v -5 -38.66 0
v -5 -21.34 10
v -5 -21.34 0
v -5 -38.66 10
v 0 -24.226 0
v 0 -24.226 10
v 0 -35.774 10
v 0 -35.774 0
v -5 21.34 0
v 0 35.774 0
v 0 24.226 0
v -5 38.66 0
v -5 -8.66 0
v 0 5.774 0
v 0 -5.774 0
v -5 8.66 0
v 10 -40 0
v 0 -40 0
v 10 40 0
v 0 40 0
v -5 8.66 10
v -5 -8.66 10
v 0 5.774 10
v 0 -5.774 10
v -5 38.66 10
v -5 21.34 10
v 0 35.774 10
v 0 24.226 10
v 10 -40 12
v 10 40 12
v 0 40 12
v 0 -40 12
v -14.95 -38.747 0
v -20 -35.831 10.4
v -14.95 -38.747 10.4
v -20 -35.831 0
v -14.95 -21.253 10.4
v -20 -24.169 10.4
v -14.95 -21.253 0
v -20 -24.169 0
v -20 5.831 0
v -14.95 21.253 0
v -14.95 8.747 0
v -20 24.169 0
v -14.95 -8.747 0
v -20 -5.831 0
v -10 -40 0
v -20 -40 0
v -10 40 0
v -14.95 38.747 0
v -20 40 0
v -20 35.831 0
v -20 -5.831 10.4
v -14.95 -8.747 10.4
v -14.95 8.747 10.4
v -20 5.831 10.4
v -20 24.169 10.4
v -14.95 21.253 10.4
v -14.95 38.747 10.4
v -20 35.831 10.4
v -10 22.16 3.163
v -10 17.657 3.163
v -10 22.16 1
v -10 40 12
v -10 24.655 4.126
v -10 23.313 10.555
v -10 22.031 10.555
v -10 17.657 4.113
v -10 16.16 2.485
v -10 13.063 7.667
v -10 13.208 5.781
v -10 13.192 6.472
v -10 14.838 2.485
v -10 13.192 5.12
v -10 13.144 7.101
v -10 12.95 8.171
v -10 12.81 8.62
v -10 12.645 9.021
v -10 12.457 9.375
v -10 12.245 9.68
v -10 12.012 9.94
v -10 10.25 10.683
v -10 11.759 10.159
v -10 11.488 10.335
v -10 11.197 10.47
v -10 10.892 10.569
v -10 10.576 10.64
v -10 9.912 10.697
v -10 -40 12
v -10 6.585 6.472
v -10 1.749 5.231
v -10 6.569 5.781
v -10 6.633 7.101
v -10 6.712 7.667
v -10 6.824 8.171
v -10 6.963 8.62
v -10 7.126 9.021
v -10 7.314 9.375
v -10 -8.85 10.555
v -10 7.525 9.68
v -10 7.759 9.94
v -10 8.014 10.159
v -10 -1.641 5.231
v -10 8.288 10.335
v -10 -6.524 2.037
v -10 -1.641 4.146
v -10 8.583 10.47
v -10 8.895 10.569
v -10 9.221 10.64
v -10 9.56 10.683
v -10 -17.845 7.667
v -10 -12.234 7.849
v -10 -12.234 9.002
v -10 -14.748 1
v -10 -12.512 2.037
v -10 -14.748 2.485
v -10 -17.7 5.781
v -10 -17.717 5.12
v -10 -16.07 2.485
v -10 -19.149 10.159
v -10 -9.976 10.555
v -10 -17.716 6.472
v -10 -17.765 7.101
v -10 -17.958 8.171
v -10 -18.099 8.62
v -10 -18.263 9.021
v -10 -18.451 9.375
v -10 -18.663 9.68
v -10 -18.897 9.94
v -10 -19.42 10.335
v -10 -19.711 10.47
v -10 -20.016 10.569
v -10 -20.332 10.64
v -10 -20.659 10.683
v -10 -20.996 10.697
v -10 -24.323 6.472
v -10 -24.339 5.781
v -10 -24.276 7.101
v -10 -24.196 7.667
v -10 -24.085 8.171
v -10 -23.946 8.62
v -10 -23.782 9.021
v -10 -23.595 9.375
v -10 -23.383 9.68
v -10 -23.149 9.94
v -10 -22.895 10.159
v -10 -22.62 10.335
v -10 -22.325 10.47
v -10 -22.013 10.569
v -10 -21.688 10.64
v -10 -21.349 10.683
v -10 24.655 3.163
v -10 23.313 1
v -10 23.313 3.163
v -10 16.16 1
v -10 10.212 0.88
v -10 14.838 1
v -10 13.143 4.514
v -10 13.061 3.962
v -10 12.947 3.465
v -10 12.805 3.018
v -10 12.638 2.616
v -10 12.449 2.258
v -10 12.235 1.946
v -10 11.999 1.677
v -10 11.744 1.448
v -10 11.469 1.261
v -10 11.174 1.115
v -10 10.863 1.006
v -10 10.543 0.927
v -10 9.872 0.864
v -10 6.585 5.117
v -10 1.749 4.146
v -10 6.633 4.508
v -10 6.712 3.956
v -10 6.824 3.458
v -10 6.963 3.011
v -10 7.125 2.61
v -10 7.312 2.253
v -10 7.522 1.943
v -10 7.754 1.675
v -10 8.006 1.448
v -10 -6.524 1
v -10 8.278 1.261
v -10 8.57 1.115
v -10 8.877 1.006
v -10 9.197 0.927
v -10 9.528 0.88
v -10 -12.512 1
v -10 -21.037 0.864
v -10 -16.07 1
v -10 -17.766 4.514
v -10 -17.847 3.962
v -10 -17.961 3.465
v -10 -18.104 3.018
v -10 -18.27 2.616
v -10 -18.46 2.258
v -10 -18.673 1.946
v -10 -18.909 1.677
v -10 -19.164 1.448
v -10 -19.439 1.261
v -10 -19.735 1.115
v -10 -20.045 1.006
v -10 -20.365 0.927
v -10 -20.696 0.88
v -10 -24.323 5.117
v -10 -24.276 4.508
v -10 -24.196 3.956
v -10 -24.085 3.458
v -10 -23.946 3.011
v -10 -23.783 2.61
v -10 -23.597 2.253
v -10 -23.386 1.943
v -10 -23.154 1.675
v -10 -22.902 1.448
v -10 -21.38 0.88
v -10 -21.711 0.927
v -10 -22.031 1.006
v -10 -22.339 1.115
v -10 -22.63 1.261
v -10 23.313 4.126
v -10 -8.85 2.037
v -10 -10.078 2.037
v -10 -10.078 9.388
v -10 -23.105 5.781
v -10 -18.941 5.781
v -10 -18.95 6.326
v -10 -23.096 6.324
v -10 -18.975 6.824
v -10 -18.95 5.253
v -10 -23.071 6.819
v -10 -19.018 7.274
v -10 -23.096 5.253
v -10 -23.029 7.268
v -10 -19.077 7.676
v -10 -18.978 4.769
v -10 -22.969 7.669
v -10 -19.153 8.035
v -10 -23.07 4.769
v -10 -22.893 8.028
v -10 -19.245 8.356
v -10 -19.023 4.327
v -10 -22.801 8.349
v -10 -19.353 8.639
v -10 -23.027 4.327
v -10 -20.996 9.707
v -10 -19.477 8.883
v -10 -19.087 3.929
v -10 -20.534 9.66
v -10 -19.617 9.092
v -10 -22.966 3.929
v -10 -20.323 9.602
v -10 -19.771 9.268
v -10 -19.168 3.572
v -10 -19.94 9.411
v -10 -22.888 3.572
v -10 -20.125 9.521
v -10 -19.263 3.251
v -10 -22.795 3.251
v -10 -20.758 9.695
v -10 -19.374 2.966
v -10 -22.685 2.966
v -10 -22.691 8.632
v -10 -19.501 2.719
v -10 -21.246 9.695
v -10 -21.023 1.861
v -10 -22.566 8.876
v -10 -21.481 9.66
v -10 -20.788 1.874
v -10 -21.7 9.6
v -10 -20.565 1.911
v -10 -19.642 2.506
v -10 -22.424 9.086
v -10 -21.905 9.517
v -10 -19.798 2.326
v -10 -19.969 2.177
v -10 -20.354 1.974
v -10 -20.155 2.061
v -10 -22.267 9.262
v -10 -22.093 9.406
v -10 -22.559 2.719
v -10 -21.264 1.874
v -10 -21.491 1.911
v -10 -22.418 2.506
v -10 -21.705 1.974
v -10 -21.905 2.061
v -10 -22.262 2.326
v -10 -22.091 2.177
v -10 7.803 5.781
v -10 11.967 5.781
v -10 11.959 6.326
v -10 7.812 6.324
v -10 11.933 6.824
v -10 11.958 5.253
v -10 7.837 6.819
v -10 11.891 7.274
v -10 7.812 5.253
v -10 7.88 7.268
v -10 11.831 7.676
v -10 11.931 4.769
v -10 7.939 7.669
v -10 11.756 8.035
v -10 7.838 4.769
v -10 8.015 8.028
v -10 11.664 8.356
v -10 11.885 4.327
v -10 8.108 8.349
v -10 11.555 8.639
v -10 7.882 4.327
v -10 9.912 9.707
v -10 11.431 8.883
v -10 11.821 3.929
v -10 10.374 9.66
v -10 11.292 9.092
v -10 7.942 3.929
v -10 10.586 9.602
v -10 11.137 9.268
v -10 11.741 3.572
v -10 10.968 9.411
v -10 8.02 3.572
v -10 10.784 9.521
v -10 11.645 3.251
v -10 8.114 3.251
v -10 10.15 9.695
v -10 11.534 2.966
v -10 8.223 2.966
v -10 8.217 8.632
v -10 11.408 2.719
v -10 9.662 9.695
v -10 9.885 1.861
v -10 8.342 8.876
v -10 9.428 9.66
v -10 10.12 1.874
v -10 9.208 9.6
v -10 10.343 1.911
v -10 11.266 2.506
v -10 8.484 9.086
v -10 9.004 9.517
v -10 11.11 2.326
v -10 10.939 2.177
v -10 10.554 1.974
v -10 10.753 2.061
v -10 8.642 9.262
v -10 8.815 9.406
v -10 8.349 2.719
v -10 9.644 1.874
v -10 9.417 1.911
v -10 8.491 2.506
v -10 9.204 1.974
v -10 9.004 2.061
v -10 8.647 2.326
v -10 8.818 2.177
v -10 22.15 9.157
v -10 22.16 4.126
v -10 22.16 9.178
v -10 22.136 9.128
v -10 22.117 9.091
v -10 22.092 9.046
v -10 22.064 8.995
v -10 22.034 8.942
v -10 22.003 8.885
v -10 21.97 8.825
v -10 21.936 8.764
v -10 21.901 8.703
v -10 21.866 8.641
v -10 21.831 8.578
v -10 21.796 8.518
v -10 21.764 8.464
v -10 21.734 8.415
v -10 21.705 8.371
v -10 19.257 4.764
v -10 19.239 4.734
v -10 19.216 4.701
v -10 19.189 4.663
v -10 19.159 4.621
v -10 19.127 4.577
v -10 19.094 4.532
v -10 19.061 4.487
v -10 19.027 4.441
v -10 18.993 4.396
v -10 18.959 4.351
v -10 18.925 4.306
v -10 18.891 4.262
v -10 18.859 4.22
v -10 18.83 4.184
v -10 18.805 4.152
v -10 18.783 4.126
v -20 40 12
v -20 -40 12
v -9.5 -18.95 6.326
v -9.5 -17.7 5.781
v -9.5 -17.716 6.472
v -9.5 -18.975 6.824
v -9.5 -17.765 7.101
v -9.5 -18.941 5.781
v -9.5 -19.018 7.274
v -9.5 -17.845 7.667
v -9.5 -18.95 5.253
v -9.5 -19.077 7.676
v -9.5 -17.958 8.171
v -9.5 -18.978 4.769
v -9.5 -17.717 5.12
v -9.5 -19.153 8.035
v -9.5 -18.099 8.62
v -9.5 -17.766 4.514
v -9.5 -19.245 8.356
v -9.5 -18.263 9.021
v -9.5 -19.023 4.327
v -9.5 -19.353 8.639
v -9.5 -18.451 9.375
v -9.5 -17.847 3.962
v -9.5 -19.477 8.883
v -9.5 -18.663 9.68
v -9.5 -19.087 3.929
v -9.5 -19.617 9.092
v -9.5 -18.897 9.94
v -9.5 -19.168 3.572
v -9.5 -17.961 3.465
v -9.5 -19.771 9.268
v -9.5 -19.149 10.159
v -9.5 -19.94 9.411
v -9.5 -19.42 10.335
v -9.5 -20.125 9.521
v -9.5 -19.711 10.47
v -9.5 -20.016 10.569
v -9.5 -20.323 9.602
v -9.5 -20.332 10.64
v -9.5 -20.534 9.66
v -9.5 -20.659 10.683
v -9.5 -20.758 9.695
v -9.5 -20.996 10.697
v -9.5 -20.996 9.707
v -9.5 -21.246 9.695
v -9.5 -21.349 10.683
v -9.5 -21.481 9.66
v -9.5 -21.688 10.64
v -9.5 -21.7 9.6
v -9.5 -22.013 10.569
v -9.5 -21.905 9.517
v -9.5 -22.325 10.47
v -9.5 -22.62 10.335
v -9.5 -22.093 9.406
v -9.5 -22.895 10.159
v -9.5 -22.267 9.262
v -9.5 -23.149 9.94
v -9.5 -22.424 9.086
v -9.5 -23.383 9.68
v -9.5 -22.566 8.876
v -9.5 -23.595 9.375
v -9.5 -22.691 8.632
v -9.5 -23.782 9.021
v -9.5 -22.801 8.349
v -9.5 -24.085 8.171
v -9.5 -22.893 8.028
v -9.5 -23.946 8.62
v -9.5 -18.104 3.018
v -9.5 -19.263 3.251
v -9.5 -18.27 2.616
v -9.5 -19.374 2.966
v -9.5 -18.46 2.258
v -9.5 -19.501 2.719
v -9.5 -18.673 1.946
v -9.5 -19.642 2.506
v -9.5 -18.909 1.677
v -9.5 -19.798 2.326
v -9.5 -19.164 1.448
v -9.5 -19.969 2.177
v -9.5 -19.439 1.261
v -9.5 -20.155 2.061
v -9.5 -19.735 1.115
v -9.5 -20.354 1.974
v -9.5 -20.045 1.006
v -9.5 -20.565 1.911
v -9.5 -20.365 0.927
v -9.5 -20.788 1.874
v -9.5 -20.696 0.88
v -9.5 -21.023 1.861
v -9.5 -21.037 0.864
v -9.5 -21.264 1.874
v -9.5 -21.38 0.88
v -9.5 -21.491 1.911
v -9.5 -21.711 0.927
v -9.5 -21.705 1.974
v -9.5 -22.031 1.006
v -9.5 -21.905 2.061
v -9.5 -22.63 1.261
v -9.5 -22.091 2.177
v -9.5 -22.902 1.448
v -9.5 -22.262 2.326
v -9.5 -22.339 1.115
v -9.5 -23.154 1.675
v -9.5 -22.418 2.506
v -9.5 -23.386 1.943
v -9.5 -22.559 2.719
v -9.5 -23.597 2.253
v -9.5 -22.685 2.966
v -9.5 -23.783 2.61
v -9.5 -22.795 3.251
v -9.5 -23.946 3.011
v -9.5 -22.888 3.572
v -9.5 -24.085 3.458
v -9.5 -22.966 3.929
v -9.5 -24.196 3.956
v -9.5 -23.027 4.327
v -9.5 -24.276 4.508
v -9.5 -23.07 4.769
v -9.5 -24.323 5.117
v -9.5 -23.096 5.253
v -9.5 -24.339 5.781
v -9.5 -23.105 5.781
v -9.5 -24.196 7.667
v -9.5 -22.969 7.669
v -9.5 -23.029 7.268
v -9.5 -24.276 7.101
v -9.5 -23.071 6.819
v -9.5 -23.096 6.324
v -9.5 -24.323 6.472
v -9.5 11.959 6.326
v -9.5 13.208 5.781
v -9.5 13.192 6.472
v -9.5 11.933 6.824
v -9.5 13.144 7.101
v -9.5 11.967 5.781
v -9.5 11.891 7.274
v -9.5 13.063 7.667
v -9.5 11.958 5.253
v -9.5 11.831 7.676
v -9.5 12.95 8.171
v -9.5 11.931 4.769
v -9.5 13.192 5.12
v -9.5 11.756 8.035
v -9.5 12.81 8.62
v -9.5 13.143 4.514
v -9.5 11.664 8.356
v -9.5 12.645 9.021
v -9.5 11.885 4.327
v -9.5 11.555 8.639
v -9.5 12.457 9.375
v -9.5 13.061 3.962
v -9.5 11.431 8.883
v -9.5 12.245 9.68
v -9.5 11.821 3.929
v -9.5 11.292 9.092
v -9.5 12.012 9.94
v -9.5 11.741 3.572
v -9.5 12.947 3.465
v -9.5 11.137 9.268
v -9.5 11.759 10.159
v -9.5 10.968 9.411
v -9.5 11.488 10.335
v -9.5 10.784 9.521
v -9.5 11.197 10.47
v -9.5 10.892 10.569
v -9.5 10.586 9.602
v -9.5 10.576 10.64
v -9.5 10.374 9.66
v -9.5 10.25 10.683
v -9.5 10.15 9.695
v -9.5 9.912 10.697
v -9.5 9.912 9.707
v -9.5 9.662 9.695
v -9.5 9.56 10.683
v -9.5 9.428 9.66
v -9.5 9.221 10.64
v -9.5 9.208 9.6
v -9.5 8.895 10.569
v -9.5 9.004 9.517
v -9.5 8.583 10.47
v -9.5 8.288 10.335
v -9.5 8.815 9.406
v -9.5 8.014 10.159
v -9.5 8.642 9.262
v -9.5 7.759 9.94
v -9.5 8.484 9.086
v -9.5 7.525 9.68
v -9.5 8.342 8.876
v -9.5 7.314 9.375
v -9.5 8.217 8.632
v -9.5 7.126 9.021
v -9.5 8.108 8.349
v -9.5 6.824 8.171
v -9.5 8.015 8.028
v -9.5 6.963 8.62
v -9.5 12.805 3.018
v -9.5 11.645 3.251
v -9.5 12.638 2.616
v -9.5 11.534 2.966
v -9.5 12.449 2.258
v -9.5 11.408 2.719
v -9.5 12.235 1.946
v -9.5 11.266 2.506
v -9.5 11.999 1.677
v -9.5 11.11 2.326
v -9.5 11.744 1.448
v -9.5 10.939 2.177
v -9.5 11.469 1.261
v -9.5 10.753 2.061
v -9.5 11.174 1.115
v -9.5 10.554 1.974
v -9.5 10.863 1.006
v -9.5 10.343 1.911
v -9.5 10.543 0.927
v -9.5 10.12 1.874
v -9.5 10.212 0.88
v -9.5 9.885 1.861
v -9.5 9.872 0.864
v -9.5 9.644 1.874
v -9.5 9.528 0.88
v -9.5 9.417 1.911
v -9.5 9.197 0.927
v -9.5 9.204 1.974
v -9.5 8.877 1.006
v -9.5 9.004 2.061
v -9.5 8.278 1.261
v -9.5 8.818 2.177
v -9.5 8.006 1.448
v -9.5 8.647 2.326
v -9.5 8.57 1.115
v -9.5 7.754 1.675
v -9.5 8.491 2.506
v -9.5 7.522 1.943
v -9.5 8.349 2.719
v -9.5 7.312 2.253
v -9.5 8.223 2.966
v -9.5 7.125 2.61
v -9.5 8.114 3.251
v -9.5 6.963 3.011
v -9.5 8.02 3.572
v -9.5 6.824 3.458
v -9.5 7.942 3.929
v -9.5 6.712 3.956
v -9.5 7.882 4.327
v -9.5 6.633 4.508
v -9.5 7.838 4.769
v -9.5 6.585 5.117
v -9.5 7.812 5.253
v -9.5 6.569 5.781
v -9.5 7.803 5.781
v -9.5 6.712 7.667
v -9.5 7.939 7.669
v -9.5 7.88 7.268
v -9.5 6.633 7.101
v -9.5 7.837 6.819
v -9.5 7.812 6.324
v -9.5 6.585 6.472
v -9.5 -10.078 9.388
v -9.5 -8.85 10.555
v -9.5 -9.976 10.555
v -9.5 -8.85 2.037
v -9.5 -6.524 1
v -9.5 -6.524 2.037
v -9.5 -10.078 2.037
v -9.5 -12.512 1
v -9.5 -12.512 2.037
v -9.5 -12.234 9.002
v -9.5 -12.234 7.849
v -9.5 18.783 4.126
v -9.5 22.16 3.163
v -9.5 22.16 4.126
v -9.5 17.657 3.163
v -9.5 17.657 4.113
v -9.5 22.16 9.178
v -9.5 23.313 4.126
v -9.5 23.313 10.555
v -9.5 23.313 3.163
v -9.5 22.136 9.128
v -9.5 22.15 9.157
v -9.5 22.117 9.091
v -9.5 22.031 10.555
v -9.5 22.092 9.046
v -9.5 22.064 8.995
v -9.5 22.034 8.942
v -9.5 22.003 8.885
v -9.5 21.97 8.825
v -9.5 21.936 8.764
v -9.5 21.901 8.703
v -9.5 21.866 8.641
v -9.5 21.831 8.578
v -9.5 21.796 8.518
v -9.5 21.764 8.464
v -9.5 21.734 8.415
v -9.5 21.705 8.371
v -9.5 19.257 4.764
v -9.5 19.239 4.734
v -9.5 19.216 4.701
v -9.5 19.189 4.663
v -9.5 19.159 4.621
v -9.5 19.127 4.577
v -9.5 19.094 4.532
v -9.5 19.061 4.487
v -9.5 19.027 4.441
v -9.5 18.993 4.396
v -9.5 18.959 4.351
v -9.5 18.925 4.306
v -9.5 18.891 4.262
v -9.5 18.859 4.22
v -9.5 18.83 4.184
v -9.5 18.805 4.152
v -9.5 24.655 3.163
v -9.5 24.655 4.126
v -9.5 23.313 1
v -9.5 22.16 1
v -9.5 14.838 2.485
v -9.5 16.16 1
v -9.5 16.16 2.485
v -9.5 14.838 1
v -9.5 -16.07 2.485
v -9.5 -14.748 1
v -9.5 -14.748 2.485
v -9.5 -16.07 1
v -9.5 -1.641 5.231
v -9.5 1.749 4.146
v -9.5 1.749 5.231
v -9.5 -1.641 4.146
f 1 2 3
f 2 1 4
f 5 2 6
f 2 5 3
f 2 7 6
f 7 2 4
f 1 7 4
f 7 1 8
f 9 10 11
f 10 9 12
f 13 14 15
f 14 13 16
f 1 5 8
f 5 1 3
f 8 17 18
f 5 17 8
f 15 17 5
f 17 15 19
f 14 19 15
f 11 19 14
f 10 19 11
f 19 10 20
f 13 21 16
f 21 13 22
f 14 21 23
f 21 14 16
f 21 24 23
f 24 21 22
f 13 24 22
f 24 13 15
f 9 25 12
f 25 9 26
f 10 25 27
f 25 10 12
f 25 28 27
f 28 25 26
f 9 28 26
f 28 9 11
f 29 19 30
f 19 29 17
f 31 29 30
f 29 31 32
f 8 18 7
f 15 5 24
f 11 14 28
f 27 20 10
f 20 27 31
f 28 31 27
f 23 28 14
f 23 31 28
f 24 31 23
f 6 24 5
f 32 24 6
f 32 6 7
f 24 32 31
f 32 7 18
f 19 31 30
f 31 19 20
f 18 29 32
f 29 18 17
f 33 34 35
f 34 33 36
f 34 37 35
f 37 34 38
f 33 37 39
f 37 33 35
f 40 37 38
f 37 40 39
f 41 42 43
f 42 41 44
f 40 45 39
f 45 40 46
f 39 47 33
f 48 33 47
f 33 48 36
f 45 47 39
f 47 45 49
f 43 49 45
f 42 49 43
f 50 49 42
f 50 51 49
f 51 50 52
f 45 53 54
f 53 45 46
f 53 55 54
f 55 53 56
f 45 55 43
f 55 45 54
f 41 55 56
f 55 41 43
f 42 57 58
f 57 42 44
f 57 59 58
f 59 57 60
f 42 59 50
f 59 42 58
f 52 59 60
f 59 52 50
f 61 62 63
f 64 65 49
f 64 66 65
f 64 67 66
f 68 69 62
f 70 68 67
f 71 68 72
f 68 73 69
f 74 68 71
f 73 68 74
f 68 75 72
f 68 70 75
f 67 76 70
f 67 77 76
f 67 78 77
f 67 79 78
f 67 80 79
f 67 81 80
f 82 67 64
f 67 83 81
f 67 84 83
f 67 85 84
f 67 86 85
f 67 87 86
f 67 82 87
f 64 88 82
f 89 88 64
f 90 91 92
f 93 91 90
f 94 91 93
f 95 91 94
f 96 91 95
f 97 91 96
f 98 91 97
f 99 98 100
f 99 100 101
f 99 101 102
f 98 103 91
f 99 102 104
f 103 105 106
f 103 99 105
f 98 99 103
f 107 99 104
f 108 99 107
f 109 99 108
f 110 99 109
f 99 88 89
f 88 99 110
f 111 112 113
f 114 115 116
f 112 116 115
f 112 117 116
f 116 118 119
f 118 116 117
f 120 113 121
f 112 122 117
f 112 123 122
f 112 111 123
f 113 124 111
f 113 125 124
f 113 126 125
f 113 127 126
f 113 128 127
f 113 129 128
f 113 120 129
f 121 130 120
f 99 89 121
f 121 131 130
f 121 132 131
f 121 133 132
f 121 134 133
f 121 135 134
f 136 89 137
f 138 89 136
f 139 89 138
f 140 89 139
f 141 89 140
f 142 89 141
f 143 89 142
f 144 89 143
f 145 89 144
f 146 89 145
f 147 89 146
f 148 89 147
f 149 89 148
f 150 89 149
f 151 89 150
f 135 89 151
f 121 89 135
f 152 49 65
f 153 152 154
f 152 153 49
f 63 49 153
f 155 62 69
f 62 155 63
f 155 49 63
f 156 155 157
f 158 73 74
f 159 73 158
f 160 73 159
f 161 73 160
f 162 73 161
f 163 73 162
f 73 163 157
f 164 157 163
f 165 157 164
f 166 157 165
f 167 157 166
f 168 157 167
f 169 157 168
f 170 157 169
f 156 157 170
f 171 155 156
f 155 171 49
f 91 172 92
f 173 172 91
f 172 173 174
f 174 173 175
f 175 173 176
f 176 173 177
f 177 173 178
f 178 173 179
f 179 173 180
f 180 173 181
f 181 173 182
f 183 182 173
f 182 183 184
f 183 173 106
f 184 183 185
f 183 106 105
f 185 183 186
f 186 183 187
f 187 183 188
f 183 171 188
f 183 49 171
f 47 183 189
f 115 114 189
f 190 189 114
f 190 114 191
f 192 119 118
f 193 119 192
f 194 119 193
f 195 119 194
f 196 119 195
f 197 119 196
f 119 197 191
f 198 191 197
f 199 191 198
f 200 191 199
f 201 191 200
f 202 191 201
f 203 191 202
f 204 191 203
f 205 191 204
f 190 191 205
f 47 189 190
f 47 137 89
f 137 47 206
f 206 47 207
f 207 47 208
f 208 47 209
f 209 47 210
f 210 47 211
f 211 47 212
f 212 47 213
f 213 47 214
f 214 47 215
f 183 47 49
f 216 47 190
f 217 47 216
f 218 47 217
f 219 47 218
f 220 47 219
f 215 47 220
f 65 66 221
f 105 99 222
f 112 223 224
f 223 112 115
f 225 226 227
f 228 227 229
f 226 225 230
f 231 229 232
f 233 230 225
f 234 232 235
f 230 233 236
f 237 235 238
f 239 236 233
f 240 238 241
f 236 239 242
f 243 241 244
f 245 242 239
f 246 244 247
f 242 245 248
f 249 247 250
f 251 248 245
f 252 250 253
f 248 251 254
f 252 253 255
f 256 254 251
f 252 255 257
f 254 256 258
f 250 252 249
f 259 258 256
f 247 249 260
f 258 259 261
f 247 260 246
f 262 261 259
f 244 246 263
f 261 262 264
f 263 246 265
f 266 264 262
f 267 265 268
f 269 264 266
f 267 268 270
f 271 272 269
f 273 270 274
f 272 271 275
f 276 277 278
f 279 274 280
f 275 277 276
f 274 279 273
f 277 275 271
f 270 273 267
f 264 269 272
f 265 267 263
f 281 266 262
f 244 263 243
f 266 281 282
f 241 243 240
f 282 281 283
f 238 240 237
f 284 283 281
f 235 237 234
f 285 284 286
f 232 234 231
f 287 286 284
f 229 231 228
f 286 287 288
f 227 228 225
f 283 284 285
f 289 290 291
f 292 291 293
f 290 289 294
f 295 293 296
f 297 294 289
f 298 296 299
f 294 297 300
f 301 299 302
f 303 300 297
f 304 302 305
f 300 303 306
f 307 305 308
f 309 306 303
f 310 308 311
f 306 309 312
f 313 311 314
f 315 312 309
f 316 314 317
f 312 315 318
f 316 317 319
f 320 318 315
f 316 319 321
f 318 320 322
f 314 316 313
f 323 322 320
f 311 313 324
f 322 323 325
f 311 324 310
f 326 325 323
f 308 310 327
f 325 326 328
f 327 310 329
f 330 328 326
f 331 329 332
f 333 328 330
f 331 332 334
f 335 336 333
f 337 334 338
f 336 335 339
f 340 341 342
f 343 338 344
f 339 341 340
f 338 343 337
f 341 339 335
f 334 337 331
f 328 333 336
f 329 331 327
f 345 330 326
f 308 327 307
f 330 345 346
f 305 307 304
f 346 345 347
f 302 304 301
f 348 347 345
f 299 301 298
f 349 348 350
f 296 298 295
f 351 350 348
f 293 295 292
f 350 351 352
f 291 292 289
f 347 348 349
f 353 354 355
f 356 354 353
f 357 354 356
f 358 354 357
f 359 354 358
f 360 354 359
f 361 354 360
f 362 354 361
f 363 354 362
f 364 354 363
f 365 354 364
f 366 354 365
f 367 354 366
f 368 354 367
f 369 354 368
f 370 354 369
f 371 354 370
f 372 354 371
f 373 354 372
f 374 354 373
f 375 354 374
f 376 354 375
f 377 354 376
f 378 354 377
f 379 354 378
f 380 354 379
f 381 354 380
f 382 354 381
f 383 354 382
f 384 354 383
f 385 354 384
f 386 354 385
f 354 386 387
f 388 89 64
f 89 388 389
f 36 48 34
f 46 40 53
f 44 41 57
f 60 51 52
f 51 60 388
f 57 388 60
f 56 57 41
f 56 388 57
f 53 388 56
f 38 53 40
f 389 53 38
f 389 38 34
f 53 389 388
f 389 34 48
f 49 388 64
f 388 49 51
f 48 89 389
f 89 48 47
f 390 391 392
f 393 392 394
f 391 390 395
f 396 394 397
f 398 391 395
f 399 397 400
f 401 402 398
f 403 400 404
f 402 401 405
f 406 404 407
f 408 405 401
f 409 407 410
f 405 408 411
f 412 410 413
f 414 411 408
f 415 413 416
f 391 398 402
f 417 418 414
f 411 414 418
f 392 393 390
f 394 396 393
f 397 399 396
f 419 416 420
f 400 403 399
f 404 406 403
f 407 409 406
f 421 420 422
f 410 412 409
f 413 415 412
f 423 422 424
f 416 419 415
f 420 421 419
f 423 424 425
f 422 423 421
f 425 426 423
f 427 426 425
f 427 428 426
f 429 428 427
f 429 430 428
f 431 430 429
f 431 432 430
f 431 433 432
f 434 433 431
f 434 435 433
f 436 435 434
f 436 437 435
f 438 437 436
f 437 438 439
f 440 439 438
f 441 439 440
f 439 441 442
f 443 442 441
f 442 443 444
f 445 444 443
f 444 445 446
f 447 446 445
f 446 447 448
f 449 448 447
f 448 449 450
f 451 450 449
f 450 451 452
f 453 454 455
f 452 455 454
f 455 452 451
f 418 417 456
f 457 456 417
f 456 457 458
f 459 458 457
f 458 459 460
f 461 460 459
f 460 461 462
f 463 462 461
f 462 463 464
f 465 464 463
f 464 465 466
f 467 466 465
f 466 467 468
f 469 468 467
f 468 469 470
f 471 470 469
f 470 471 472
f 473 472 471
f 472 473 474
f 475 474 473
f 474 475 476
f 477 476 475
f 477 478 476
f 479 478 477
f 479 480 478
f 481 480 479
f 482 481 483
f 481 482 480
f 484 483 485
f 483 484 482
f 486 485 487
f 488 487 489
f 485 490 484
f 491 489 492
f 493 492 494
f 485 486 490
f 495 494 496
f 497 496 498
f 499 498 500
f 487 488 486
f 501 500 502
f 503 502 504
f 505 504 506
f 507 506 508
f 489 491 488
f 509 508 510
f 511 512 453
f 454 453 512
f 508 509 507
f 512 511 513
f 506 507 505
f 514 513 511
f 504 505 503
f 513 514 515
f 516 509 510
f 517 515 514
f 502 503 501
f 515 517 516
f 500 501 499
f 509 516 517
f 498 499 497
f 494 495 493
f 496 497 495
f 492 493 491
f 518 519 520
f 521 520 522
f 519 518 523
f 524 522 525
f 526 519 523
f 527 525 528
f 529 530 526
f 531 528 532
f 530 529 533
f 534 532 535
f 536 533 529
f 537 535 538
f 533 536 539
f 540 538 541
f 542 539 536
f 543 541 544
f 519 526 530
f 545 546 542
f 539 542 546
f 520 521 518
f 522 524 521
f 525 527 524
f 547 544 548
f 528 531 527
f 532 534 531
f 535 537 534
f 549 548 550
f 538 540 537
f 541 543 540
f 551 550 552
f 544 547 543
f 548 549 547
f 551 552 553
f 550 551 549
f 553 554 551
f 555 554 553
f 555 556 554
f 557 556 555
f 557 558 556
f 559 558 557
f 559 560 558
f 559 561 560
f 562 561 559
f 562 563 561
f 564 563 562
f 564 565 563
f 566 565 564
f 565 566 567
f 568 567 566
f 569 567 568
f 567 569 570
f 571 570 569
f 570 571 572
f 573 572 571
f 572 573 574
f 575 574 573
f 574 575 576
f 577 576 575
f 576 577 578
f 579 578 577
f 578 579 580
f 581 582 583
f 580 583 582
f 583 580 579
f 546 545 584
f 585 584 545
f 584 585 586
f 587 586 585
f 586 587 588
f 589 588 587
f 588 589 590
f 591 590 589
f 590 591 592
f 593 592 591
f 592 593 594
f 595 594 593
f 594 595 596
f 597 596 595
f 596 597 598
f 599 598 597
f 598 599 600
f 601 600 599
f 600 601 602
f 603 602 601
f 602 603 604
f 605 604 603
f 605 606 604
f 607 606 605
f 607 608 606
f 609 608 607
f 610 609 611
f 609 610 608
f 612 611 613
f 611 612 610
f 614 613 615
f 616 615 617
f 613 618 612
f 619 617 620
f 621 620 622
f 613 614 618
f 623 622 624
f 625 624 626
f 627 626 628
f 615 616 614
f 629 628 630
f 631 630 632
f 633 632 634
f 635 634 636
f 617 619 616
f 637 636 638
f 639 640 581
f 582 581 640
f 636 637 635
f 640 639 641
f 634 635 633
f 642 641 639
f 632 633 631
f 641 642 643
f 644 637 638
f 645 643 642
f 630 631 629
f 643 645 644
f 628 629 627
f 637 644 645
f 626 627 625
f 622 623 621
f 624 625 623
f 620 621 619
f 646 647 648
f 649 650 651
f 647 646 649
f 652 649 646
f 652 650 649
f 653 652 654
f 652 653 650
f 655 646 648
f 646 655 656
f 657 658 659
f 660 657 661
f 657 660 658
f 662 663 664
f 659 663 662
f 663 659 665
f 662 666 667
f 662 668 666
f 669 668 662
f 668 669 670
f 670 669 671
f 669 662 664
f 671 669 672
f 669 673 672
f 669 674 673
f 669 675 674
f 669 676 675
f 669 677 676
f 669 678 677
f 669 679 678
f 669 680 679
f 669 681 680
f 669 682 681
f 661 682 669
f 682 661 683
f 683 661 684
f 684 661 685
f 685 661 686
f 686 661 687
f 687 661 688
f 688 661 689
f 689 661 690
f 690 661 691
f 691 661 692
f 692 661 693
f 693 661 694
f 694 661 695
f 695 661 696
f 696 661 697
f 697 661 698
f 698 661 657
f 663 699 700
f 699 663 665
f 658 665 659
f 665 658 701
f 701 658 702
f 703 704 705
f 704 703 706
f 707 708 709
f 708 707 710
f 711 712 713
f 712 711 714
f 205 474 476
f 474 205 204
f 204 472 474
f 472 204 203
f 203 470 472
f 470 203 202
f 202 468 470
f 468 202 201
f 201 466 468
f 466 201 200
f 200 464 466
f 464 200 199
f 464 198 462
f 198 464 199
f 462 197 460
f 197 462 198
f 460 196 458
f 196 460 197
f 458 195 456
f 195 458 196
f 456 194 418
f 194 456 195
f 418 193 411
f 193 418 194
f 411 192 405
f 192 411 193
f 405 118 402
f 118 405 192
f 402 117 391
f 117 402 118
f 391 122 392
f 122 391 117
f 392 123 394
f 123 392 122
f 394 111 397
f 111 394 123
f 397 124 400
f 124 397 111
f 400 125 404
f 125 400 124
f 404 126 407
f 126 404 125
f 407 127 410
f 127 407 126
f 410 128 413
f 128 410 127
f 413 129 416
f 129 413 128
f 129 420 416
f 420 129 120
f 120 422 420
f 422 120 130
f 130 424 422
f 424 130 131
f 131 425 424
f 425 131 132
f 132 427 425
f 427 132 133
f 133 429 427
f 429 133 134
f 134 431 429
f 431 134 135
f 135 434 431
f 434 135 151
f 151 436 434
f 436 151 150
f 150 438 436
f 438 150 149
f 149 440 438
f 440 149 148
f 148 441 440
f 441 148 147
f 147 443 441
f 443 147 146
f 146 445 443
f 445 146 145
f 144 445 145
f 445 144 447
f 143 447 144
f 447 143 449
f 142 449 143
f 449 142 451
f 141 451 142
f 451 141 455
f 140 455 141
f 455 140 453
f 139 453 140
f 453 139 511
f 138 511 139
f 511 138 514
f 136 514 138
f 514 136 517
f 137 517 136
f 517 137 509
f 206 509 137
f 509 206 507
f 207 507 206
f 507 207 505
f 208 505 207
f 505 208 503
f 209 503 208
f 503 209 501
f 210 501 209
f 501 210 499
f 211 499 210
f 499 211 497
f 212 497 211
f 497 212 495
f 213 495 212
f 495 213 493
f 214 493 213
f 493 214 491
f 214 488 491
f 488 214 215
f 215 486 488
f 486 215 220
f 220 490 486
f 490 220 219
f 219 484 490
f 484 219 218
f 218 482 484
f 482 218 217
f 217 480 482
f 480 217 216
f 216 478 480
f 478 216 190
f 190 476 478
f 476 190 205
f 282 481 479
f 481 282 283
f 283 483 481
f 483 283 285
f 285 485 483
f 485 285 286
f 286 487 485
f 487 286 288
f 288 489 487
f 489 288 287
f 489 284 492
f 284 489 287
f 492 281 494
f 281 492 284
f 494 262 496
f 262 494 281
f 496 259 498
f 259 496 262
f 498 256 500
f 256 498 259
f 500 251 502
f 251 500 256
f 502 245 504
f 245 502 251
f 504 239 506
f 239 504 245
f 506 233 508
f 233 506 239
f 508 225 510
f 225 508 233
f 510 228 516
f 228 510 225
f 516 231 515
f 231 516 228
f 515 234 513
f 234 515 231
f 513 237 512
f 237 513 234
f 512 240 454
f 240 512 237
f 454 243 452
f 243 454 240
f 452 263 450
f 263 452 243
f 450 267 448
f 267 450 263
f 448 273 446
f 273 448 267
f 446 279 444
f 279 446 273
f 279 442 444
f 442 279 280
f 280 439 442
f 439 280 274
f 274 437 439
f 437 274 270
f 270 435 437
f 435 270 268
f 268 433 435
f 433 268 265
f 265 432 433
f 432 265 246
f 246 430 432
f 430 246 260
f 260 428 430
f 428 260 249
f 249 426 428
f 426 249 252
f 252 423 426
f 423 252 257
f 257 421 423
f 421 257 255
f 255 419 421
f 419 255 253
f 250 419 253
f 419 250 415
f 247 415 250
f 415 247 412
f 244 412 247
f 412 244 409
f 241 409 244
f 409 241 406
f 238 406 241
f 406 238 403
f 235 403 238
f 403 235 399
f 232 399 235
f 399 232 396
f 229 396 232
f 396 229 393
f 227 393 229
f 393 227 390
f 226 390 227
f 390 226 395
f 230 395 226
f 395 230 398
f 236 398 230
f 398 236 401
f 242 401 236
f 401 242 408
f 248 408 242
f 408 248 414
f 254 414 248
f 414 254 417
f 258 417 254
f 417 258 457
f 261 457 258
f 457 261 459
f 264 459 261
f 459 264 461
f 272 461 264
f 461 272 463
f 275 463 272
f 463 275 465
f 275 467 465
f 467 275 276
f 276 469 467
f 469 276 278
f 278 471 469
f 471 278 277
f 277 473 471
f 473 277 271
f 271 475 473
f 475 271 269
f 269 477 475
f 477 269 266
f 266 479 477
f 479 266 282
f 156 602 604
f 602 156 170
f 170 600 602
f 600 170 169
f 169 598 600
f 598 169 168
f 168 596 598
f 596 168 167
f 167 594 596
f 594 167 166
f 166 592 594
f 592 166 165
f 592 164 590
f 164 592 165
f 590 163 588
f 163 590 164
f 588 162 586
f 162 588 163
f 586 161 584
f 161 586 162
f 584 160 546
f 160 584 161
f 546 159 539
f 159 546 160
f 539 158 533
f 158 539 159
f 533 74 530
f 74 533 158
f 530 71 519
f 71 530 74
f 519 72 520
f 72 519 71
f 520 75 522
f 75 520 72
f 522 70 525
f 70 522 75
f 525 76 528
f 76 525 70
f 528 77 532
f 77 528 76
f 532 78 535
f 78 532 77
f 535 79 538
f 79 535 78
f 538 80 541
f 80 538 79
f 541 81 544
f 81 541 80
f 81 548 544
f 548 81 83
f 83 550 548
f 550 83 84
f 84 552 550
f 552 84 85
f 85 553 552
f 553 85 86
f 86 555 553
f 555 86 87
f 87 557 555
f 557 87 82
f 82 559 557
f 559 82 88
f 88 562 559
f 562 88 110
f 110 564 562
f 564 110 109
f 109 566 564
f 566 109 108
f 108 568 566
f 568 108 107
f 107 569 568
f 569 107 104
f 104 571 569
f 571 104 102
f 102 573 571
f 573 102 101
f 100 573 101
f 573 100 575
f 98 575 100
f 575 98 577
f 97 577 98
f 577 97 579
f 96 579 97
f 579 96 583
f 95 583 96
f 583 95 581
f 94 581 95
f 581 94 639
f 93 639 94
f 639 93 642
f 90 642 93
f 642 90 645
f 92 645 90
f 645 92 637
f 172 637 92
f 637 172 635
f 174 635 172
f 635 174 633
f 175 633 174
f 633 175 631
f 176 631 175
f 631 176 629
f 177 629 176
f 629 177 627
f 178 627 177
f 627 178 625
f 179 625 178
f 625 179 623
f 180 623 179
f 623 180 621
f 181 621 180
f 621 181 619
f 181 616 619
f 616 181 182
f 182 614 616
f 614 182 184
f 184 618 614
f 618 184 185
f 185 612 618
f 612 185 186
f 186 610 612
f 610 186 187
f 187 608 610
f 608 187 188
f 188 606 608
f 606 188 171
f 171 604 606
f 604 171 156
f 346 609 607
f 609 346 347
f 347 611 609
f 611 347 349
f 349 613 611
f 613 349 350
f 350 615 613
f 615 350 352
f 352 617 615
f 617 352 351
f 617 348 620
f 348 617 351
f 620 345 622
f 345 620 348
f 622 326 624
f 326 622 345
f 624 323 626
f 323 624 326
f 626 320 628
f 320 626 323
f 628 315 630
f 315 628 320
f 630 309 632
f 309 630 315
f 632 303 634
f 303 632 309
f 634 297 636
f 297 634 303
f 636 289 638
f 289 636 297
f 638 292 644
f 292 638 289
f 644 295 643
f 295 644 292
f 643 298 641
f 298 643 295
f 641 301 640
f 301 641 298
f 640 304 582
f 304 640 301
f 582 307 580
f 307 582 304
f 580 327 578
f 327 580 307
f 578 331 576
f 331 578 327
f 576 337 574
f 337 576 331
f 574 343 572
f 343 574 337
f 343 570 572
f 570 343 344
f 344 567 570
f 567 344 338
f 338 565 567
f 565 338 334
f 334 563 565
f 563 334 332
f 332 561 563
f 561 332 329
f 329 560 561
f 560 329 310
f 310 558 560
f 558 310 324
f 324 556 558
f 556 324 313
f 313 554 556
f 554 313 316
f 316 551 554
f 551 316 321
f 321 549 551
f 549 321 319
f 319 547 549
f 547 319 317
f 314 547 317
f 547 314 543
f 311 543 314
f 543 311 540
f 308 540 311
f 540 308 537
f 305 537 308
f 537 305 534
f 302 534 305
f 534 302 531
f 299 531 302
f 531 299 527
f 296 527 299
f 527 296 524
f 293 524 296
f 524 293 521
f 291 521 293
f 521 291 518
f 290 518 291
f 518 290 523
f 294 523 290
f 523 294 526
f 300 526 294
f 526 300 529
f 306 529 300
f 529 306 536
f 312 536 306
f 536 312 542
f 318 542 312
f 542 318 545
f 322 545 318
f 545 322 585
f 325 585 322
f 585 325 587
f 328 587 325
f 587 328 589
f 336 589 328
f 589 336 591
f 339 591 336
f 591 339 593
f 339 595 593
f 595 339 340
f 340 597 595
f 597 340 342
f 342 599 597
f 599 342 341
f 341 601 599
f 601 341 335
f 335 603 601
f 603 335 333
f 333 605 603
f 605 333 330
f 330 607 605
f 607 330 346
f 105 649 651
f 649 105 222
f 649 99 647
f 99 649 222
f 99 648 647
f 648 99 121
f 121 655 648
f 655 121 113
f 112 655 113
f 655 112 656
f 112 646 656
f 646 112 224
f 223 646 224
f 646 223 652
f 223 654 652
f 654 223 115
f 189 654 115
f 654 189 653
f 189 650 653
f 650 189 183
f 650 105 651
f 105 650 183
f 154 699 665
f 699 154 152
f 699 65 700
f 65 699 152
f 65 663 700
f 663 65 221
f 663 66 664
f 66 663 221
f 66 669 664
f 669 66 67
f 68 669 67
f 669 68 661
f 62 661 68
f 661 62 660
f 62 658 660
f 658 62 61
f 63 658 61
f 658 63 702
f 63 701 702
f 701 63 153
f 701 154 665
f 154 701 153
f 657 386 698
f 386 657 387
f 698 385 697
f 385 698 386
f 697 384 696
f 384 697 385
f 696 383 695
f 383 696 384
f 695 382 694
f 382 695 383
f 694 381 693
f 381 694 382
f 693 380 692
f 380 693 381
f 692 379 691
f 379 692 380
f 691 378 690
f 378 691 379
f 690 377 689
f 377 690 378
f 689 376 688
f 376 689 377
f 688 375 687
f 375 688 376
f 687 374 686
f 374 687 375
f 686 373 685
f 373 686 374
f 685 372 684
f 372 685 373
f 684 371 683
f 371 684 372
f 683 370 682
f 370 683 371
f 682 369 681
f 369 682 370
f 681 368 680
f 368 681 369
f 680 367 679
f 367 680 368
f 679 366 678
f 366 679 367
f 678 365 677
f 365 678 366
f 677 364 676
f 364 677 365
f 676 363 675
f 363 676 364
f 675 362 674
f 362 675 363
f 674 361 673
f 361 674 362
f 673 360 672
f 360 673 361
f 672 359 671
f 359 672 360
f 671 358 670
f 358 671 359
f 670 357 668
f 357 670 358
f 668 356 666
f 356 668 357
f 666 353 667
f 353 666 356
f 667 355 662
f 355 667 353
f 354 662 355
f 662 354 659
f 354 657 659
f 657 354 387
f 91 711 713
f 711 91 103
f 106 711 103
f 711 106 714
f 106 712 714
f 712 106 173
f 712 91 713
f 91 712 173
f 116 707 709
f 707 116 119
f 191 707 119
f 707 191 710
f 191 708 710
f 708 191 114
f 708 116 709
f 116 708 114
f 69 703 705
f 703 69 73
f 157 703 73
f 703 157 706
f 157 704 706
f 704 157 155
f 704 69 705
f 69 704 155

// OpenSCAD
h=10;
delta=0.1;
top_clearance=0.4;

module pylon(d, t) {
  cylinder(h=h + t, r=10 + d, $fn=3);
}


module mass() {
  translate([0, -40, 0]) cube([10, 80, h + 2]);
}

module t(d, t) {
  translate([10,0,1]) rotate([90,0,90])linear_extrude(0.5) text(str(d, " - ", t), halign="center", size=h);
}

module side_a() {
  union() {
    mass();
    for (y=[-30,0,30]) {
      translate([0, y, 0]) pylon(0, 0);
    }
  }
}

module side_b(d, t) {
  union() {
    t(d, t);
    difference() {
      mass();
      for (y=[-30,0,30]) {
        translate([0, y, 0]) rotate([0,0,180])
          pylon(d, t);
      }
    }
  }
}


side_a();
translate([-20, 0, 0]) side_b(delta, top_clearance);
